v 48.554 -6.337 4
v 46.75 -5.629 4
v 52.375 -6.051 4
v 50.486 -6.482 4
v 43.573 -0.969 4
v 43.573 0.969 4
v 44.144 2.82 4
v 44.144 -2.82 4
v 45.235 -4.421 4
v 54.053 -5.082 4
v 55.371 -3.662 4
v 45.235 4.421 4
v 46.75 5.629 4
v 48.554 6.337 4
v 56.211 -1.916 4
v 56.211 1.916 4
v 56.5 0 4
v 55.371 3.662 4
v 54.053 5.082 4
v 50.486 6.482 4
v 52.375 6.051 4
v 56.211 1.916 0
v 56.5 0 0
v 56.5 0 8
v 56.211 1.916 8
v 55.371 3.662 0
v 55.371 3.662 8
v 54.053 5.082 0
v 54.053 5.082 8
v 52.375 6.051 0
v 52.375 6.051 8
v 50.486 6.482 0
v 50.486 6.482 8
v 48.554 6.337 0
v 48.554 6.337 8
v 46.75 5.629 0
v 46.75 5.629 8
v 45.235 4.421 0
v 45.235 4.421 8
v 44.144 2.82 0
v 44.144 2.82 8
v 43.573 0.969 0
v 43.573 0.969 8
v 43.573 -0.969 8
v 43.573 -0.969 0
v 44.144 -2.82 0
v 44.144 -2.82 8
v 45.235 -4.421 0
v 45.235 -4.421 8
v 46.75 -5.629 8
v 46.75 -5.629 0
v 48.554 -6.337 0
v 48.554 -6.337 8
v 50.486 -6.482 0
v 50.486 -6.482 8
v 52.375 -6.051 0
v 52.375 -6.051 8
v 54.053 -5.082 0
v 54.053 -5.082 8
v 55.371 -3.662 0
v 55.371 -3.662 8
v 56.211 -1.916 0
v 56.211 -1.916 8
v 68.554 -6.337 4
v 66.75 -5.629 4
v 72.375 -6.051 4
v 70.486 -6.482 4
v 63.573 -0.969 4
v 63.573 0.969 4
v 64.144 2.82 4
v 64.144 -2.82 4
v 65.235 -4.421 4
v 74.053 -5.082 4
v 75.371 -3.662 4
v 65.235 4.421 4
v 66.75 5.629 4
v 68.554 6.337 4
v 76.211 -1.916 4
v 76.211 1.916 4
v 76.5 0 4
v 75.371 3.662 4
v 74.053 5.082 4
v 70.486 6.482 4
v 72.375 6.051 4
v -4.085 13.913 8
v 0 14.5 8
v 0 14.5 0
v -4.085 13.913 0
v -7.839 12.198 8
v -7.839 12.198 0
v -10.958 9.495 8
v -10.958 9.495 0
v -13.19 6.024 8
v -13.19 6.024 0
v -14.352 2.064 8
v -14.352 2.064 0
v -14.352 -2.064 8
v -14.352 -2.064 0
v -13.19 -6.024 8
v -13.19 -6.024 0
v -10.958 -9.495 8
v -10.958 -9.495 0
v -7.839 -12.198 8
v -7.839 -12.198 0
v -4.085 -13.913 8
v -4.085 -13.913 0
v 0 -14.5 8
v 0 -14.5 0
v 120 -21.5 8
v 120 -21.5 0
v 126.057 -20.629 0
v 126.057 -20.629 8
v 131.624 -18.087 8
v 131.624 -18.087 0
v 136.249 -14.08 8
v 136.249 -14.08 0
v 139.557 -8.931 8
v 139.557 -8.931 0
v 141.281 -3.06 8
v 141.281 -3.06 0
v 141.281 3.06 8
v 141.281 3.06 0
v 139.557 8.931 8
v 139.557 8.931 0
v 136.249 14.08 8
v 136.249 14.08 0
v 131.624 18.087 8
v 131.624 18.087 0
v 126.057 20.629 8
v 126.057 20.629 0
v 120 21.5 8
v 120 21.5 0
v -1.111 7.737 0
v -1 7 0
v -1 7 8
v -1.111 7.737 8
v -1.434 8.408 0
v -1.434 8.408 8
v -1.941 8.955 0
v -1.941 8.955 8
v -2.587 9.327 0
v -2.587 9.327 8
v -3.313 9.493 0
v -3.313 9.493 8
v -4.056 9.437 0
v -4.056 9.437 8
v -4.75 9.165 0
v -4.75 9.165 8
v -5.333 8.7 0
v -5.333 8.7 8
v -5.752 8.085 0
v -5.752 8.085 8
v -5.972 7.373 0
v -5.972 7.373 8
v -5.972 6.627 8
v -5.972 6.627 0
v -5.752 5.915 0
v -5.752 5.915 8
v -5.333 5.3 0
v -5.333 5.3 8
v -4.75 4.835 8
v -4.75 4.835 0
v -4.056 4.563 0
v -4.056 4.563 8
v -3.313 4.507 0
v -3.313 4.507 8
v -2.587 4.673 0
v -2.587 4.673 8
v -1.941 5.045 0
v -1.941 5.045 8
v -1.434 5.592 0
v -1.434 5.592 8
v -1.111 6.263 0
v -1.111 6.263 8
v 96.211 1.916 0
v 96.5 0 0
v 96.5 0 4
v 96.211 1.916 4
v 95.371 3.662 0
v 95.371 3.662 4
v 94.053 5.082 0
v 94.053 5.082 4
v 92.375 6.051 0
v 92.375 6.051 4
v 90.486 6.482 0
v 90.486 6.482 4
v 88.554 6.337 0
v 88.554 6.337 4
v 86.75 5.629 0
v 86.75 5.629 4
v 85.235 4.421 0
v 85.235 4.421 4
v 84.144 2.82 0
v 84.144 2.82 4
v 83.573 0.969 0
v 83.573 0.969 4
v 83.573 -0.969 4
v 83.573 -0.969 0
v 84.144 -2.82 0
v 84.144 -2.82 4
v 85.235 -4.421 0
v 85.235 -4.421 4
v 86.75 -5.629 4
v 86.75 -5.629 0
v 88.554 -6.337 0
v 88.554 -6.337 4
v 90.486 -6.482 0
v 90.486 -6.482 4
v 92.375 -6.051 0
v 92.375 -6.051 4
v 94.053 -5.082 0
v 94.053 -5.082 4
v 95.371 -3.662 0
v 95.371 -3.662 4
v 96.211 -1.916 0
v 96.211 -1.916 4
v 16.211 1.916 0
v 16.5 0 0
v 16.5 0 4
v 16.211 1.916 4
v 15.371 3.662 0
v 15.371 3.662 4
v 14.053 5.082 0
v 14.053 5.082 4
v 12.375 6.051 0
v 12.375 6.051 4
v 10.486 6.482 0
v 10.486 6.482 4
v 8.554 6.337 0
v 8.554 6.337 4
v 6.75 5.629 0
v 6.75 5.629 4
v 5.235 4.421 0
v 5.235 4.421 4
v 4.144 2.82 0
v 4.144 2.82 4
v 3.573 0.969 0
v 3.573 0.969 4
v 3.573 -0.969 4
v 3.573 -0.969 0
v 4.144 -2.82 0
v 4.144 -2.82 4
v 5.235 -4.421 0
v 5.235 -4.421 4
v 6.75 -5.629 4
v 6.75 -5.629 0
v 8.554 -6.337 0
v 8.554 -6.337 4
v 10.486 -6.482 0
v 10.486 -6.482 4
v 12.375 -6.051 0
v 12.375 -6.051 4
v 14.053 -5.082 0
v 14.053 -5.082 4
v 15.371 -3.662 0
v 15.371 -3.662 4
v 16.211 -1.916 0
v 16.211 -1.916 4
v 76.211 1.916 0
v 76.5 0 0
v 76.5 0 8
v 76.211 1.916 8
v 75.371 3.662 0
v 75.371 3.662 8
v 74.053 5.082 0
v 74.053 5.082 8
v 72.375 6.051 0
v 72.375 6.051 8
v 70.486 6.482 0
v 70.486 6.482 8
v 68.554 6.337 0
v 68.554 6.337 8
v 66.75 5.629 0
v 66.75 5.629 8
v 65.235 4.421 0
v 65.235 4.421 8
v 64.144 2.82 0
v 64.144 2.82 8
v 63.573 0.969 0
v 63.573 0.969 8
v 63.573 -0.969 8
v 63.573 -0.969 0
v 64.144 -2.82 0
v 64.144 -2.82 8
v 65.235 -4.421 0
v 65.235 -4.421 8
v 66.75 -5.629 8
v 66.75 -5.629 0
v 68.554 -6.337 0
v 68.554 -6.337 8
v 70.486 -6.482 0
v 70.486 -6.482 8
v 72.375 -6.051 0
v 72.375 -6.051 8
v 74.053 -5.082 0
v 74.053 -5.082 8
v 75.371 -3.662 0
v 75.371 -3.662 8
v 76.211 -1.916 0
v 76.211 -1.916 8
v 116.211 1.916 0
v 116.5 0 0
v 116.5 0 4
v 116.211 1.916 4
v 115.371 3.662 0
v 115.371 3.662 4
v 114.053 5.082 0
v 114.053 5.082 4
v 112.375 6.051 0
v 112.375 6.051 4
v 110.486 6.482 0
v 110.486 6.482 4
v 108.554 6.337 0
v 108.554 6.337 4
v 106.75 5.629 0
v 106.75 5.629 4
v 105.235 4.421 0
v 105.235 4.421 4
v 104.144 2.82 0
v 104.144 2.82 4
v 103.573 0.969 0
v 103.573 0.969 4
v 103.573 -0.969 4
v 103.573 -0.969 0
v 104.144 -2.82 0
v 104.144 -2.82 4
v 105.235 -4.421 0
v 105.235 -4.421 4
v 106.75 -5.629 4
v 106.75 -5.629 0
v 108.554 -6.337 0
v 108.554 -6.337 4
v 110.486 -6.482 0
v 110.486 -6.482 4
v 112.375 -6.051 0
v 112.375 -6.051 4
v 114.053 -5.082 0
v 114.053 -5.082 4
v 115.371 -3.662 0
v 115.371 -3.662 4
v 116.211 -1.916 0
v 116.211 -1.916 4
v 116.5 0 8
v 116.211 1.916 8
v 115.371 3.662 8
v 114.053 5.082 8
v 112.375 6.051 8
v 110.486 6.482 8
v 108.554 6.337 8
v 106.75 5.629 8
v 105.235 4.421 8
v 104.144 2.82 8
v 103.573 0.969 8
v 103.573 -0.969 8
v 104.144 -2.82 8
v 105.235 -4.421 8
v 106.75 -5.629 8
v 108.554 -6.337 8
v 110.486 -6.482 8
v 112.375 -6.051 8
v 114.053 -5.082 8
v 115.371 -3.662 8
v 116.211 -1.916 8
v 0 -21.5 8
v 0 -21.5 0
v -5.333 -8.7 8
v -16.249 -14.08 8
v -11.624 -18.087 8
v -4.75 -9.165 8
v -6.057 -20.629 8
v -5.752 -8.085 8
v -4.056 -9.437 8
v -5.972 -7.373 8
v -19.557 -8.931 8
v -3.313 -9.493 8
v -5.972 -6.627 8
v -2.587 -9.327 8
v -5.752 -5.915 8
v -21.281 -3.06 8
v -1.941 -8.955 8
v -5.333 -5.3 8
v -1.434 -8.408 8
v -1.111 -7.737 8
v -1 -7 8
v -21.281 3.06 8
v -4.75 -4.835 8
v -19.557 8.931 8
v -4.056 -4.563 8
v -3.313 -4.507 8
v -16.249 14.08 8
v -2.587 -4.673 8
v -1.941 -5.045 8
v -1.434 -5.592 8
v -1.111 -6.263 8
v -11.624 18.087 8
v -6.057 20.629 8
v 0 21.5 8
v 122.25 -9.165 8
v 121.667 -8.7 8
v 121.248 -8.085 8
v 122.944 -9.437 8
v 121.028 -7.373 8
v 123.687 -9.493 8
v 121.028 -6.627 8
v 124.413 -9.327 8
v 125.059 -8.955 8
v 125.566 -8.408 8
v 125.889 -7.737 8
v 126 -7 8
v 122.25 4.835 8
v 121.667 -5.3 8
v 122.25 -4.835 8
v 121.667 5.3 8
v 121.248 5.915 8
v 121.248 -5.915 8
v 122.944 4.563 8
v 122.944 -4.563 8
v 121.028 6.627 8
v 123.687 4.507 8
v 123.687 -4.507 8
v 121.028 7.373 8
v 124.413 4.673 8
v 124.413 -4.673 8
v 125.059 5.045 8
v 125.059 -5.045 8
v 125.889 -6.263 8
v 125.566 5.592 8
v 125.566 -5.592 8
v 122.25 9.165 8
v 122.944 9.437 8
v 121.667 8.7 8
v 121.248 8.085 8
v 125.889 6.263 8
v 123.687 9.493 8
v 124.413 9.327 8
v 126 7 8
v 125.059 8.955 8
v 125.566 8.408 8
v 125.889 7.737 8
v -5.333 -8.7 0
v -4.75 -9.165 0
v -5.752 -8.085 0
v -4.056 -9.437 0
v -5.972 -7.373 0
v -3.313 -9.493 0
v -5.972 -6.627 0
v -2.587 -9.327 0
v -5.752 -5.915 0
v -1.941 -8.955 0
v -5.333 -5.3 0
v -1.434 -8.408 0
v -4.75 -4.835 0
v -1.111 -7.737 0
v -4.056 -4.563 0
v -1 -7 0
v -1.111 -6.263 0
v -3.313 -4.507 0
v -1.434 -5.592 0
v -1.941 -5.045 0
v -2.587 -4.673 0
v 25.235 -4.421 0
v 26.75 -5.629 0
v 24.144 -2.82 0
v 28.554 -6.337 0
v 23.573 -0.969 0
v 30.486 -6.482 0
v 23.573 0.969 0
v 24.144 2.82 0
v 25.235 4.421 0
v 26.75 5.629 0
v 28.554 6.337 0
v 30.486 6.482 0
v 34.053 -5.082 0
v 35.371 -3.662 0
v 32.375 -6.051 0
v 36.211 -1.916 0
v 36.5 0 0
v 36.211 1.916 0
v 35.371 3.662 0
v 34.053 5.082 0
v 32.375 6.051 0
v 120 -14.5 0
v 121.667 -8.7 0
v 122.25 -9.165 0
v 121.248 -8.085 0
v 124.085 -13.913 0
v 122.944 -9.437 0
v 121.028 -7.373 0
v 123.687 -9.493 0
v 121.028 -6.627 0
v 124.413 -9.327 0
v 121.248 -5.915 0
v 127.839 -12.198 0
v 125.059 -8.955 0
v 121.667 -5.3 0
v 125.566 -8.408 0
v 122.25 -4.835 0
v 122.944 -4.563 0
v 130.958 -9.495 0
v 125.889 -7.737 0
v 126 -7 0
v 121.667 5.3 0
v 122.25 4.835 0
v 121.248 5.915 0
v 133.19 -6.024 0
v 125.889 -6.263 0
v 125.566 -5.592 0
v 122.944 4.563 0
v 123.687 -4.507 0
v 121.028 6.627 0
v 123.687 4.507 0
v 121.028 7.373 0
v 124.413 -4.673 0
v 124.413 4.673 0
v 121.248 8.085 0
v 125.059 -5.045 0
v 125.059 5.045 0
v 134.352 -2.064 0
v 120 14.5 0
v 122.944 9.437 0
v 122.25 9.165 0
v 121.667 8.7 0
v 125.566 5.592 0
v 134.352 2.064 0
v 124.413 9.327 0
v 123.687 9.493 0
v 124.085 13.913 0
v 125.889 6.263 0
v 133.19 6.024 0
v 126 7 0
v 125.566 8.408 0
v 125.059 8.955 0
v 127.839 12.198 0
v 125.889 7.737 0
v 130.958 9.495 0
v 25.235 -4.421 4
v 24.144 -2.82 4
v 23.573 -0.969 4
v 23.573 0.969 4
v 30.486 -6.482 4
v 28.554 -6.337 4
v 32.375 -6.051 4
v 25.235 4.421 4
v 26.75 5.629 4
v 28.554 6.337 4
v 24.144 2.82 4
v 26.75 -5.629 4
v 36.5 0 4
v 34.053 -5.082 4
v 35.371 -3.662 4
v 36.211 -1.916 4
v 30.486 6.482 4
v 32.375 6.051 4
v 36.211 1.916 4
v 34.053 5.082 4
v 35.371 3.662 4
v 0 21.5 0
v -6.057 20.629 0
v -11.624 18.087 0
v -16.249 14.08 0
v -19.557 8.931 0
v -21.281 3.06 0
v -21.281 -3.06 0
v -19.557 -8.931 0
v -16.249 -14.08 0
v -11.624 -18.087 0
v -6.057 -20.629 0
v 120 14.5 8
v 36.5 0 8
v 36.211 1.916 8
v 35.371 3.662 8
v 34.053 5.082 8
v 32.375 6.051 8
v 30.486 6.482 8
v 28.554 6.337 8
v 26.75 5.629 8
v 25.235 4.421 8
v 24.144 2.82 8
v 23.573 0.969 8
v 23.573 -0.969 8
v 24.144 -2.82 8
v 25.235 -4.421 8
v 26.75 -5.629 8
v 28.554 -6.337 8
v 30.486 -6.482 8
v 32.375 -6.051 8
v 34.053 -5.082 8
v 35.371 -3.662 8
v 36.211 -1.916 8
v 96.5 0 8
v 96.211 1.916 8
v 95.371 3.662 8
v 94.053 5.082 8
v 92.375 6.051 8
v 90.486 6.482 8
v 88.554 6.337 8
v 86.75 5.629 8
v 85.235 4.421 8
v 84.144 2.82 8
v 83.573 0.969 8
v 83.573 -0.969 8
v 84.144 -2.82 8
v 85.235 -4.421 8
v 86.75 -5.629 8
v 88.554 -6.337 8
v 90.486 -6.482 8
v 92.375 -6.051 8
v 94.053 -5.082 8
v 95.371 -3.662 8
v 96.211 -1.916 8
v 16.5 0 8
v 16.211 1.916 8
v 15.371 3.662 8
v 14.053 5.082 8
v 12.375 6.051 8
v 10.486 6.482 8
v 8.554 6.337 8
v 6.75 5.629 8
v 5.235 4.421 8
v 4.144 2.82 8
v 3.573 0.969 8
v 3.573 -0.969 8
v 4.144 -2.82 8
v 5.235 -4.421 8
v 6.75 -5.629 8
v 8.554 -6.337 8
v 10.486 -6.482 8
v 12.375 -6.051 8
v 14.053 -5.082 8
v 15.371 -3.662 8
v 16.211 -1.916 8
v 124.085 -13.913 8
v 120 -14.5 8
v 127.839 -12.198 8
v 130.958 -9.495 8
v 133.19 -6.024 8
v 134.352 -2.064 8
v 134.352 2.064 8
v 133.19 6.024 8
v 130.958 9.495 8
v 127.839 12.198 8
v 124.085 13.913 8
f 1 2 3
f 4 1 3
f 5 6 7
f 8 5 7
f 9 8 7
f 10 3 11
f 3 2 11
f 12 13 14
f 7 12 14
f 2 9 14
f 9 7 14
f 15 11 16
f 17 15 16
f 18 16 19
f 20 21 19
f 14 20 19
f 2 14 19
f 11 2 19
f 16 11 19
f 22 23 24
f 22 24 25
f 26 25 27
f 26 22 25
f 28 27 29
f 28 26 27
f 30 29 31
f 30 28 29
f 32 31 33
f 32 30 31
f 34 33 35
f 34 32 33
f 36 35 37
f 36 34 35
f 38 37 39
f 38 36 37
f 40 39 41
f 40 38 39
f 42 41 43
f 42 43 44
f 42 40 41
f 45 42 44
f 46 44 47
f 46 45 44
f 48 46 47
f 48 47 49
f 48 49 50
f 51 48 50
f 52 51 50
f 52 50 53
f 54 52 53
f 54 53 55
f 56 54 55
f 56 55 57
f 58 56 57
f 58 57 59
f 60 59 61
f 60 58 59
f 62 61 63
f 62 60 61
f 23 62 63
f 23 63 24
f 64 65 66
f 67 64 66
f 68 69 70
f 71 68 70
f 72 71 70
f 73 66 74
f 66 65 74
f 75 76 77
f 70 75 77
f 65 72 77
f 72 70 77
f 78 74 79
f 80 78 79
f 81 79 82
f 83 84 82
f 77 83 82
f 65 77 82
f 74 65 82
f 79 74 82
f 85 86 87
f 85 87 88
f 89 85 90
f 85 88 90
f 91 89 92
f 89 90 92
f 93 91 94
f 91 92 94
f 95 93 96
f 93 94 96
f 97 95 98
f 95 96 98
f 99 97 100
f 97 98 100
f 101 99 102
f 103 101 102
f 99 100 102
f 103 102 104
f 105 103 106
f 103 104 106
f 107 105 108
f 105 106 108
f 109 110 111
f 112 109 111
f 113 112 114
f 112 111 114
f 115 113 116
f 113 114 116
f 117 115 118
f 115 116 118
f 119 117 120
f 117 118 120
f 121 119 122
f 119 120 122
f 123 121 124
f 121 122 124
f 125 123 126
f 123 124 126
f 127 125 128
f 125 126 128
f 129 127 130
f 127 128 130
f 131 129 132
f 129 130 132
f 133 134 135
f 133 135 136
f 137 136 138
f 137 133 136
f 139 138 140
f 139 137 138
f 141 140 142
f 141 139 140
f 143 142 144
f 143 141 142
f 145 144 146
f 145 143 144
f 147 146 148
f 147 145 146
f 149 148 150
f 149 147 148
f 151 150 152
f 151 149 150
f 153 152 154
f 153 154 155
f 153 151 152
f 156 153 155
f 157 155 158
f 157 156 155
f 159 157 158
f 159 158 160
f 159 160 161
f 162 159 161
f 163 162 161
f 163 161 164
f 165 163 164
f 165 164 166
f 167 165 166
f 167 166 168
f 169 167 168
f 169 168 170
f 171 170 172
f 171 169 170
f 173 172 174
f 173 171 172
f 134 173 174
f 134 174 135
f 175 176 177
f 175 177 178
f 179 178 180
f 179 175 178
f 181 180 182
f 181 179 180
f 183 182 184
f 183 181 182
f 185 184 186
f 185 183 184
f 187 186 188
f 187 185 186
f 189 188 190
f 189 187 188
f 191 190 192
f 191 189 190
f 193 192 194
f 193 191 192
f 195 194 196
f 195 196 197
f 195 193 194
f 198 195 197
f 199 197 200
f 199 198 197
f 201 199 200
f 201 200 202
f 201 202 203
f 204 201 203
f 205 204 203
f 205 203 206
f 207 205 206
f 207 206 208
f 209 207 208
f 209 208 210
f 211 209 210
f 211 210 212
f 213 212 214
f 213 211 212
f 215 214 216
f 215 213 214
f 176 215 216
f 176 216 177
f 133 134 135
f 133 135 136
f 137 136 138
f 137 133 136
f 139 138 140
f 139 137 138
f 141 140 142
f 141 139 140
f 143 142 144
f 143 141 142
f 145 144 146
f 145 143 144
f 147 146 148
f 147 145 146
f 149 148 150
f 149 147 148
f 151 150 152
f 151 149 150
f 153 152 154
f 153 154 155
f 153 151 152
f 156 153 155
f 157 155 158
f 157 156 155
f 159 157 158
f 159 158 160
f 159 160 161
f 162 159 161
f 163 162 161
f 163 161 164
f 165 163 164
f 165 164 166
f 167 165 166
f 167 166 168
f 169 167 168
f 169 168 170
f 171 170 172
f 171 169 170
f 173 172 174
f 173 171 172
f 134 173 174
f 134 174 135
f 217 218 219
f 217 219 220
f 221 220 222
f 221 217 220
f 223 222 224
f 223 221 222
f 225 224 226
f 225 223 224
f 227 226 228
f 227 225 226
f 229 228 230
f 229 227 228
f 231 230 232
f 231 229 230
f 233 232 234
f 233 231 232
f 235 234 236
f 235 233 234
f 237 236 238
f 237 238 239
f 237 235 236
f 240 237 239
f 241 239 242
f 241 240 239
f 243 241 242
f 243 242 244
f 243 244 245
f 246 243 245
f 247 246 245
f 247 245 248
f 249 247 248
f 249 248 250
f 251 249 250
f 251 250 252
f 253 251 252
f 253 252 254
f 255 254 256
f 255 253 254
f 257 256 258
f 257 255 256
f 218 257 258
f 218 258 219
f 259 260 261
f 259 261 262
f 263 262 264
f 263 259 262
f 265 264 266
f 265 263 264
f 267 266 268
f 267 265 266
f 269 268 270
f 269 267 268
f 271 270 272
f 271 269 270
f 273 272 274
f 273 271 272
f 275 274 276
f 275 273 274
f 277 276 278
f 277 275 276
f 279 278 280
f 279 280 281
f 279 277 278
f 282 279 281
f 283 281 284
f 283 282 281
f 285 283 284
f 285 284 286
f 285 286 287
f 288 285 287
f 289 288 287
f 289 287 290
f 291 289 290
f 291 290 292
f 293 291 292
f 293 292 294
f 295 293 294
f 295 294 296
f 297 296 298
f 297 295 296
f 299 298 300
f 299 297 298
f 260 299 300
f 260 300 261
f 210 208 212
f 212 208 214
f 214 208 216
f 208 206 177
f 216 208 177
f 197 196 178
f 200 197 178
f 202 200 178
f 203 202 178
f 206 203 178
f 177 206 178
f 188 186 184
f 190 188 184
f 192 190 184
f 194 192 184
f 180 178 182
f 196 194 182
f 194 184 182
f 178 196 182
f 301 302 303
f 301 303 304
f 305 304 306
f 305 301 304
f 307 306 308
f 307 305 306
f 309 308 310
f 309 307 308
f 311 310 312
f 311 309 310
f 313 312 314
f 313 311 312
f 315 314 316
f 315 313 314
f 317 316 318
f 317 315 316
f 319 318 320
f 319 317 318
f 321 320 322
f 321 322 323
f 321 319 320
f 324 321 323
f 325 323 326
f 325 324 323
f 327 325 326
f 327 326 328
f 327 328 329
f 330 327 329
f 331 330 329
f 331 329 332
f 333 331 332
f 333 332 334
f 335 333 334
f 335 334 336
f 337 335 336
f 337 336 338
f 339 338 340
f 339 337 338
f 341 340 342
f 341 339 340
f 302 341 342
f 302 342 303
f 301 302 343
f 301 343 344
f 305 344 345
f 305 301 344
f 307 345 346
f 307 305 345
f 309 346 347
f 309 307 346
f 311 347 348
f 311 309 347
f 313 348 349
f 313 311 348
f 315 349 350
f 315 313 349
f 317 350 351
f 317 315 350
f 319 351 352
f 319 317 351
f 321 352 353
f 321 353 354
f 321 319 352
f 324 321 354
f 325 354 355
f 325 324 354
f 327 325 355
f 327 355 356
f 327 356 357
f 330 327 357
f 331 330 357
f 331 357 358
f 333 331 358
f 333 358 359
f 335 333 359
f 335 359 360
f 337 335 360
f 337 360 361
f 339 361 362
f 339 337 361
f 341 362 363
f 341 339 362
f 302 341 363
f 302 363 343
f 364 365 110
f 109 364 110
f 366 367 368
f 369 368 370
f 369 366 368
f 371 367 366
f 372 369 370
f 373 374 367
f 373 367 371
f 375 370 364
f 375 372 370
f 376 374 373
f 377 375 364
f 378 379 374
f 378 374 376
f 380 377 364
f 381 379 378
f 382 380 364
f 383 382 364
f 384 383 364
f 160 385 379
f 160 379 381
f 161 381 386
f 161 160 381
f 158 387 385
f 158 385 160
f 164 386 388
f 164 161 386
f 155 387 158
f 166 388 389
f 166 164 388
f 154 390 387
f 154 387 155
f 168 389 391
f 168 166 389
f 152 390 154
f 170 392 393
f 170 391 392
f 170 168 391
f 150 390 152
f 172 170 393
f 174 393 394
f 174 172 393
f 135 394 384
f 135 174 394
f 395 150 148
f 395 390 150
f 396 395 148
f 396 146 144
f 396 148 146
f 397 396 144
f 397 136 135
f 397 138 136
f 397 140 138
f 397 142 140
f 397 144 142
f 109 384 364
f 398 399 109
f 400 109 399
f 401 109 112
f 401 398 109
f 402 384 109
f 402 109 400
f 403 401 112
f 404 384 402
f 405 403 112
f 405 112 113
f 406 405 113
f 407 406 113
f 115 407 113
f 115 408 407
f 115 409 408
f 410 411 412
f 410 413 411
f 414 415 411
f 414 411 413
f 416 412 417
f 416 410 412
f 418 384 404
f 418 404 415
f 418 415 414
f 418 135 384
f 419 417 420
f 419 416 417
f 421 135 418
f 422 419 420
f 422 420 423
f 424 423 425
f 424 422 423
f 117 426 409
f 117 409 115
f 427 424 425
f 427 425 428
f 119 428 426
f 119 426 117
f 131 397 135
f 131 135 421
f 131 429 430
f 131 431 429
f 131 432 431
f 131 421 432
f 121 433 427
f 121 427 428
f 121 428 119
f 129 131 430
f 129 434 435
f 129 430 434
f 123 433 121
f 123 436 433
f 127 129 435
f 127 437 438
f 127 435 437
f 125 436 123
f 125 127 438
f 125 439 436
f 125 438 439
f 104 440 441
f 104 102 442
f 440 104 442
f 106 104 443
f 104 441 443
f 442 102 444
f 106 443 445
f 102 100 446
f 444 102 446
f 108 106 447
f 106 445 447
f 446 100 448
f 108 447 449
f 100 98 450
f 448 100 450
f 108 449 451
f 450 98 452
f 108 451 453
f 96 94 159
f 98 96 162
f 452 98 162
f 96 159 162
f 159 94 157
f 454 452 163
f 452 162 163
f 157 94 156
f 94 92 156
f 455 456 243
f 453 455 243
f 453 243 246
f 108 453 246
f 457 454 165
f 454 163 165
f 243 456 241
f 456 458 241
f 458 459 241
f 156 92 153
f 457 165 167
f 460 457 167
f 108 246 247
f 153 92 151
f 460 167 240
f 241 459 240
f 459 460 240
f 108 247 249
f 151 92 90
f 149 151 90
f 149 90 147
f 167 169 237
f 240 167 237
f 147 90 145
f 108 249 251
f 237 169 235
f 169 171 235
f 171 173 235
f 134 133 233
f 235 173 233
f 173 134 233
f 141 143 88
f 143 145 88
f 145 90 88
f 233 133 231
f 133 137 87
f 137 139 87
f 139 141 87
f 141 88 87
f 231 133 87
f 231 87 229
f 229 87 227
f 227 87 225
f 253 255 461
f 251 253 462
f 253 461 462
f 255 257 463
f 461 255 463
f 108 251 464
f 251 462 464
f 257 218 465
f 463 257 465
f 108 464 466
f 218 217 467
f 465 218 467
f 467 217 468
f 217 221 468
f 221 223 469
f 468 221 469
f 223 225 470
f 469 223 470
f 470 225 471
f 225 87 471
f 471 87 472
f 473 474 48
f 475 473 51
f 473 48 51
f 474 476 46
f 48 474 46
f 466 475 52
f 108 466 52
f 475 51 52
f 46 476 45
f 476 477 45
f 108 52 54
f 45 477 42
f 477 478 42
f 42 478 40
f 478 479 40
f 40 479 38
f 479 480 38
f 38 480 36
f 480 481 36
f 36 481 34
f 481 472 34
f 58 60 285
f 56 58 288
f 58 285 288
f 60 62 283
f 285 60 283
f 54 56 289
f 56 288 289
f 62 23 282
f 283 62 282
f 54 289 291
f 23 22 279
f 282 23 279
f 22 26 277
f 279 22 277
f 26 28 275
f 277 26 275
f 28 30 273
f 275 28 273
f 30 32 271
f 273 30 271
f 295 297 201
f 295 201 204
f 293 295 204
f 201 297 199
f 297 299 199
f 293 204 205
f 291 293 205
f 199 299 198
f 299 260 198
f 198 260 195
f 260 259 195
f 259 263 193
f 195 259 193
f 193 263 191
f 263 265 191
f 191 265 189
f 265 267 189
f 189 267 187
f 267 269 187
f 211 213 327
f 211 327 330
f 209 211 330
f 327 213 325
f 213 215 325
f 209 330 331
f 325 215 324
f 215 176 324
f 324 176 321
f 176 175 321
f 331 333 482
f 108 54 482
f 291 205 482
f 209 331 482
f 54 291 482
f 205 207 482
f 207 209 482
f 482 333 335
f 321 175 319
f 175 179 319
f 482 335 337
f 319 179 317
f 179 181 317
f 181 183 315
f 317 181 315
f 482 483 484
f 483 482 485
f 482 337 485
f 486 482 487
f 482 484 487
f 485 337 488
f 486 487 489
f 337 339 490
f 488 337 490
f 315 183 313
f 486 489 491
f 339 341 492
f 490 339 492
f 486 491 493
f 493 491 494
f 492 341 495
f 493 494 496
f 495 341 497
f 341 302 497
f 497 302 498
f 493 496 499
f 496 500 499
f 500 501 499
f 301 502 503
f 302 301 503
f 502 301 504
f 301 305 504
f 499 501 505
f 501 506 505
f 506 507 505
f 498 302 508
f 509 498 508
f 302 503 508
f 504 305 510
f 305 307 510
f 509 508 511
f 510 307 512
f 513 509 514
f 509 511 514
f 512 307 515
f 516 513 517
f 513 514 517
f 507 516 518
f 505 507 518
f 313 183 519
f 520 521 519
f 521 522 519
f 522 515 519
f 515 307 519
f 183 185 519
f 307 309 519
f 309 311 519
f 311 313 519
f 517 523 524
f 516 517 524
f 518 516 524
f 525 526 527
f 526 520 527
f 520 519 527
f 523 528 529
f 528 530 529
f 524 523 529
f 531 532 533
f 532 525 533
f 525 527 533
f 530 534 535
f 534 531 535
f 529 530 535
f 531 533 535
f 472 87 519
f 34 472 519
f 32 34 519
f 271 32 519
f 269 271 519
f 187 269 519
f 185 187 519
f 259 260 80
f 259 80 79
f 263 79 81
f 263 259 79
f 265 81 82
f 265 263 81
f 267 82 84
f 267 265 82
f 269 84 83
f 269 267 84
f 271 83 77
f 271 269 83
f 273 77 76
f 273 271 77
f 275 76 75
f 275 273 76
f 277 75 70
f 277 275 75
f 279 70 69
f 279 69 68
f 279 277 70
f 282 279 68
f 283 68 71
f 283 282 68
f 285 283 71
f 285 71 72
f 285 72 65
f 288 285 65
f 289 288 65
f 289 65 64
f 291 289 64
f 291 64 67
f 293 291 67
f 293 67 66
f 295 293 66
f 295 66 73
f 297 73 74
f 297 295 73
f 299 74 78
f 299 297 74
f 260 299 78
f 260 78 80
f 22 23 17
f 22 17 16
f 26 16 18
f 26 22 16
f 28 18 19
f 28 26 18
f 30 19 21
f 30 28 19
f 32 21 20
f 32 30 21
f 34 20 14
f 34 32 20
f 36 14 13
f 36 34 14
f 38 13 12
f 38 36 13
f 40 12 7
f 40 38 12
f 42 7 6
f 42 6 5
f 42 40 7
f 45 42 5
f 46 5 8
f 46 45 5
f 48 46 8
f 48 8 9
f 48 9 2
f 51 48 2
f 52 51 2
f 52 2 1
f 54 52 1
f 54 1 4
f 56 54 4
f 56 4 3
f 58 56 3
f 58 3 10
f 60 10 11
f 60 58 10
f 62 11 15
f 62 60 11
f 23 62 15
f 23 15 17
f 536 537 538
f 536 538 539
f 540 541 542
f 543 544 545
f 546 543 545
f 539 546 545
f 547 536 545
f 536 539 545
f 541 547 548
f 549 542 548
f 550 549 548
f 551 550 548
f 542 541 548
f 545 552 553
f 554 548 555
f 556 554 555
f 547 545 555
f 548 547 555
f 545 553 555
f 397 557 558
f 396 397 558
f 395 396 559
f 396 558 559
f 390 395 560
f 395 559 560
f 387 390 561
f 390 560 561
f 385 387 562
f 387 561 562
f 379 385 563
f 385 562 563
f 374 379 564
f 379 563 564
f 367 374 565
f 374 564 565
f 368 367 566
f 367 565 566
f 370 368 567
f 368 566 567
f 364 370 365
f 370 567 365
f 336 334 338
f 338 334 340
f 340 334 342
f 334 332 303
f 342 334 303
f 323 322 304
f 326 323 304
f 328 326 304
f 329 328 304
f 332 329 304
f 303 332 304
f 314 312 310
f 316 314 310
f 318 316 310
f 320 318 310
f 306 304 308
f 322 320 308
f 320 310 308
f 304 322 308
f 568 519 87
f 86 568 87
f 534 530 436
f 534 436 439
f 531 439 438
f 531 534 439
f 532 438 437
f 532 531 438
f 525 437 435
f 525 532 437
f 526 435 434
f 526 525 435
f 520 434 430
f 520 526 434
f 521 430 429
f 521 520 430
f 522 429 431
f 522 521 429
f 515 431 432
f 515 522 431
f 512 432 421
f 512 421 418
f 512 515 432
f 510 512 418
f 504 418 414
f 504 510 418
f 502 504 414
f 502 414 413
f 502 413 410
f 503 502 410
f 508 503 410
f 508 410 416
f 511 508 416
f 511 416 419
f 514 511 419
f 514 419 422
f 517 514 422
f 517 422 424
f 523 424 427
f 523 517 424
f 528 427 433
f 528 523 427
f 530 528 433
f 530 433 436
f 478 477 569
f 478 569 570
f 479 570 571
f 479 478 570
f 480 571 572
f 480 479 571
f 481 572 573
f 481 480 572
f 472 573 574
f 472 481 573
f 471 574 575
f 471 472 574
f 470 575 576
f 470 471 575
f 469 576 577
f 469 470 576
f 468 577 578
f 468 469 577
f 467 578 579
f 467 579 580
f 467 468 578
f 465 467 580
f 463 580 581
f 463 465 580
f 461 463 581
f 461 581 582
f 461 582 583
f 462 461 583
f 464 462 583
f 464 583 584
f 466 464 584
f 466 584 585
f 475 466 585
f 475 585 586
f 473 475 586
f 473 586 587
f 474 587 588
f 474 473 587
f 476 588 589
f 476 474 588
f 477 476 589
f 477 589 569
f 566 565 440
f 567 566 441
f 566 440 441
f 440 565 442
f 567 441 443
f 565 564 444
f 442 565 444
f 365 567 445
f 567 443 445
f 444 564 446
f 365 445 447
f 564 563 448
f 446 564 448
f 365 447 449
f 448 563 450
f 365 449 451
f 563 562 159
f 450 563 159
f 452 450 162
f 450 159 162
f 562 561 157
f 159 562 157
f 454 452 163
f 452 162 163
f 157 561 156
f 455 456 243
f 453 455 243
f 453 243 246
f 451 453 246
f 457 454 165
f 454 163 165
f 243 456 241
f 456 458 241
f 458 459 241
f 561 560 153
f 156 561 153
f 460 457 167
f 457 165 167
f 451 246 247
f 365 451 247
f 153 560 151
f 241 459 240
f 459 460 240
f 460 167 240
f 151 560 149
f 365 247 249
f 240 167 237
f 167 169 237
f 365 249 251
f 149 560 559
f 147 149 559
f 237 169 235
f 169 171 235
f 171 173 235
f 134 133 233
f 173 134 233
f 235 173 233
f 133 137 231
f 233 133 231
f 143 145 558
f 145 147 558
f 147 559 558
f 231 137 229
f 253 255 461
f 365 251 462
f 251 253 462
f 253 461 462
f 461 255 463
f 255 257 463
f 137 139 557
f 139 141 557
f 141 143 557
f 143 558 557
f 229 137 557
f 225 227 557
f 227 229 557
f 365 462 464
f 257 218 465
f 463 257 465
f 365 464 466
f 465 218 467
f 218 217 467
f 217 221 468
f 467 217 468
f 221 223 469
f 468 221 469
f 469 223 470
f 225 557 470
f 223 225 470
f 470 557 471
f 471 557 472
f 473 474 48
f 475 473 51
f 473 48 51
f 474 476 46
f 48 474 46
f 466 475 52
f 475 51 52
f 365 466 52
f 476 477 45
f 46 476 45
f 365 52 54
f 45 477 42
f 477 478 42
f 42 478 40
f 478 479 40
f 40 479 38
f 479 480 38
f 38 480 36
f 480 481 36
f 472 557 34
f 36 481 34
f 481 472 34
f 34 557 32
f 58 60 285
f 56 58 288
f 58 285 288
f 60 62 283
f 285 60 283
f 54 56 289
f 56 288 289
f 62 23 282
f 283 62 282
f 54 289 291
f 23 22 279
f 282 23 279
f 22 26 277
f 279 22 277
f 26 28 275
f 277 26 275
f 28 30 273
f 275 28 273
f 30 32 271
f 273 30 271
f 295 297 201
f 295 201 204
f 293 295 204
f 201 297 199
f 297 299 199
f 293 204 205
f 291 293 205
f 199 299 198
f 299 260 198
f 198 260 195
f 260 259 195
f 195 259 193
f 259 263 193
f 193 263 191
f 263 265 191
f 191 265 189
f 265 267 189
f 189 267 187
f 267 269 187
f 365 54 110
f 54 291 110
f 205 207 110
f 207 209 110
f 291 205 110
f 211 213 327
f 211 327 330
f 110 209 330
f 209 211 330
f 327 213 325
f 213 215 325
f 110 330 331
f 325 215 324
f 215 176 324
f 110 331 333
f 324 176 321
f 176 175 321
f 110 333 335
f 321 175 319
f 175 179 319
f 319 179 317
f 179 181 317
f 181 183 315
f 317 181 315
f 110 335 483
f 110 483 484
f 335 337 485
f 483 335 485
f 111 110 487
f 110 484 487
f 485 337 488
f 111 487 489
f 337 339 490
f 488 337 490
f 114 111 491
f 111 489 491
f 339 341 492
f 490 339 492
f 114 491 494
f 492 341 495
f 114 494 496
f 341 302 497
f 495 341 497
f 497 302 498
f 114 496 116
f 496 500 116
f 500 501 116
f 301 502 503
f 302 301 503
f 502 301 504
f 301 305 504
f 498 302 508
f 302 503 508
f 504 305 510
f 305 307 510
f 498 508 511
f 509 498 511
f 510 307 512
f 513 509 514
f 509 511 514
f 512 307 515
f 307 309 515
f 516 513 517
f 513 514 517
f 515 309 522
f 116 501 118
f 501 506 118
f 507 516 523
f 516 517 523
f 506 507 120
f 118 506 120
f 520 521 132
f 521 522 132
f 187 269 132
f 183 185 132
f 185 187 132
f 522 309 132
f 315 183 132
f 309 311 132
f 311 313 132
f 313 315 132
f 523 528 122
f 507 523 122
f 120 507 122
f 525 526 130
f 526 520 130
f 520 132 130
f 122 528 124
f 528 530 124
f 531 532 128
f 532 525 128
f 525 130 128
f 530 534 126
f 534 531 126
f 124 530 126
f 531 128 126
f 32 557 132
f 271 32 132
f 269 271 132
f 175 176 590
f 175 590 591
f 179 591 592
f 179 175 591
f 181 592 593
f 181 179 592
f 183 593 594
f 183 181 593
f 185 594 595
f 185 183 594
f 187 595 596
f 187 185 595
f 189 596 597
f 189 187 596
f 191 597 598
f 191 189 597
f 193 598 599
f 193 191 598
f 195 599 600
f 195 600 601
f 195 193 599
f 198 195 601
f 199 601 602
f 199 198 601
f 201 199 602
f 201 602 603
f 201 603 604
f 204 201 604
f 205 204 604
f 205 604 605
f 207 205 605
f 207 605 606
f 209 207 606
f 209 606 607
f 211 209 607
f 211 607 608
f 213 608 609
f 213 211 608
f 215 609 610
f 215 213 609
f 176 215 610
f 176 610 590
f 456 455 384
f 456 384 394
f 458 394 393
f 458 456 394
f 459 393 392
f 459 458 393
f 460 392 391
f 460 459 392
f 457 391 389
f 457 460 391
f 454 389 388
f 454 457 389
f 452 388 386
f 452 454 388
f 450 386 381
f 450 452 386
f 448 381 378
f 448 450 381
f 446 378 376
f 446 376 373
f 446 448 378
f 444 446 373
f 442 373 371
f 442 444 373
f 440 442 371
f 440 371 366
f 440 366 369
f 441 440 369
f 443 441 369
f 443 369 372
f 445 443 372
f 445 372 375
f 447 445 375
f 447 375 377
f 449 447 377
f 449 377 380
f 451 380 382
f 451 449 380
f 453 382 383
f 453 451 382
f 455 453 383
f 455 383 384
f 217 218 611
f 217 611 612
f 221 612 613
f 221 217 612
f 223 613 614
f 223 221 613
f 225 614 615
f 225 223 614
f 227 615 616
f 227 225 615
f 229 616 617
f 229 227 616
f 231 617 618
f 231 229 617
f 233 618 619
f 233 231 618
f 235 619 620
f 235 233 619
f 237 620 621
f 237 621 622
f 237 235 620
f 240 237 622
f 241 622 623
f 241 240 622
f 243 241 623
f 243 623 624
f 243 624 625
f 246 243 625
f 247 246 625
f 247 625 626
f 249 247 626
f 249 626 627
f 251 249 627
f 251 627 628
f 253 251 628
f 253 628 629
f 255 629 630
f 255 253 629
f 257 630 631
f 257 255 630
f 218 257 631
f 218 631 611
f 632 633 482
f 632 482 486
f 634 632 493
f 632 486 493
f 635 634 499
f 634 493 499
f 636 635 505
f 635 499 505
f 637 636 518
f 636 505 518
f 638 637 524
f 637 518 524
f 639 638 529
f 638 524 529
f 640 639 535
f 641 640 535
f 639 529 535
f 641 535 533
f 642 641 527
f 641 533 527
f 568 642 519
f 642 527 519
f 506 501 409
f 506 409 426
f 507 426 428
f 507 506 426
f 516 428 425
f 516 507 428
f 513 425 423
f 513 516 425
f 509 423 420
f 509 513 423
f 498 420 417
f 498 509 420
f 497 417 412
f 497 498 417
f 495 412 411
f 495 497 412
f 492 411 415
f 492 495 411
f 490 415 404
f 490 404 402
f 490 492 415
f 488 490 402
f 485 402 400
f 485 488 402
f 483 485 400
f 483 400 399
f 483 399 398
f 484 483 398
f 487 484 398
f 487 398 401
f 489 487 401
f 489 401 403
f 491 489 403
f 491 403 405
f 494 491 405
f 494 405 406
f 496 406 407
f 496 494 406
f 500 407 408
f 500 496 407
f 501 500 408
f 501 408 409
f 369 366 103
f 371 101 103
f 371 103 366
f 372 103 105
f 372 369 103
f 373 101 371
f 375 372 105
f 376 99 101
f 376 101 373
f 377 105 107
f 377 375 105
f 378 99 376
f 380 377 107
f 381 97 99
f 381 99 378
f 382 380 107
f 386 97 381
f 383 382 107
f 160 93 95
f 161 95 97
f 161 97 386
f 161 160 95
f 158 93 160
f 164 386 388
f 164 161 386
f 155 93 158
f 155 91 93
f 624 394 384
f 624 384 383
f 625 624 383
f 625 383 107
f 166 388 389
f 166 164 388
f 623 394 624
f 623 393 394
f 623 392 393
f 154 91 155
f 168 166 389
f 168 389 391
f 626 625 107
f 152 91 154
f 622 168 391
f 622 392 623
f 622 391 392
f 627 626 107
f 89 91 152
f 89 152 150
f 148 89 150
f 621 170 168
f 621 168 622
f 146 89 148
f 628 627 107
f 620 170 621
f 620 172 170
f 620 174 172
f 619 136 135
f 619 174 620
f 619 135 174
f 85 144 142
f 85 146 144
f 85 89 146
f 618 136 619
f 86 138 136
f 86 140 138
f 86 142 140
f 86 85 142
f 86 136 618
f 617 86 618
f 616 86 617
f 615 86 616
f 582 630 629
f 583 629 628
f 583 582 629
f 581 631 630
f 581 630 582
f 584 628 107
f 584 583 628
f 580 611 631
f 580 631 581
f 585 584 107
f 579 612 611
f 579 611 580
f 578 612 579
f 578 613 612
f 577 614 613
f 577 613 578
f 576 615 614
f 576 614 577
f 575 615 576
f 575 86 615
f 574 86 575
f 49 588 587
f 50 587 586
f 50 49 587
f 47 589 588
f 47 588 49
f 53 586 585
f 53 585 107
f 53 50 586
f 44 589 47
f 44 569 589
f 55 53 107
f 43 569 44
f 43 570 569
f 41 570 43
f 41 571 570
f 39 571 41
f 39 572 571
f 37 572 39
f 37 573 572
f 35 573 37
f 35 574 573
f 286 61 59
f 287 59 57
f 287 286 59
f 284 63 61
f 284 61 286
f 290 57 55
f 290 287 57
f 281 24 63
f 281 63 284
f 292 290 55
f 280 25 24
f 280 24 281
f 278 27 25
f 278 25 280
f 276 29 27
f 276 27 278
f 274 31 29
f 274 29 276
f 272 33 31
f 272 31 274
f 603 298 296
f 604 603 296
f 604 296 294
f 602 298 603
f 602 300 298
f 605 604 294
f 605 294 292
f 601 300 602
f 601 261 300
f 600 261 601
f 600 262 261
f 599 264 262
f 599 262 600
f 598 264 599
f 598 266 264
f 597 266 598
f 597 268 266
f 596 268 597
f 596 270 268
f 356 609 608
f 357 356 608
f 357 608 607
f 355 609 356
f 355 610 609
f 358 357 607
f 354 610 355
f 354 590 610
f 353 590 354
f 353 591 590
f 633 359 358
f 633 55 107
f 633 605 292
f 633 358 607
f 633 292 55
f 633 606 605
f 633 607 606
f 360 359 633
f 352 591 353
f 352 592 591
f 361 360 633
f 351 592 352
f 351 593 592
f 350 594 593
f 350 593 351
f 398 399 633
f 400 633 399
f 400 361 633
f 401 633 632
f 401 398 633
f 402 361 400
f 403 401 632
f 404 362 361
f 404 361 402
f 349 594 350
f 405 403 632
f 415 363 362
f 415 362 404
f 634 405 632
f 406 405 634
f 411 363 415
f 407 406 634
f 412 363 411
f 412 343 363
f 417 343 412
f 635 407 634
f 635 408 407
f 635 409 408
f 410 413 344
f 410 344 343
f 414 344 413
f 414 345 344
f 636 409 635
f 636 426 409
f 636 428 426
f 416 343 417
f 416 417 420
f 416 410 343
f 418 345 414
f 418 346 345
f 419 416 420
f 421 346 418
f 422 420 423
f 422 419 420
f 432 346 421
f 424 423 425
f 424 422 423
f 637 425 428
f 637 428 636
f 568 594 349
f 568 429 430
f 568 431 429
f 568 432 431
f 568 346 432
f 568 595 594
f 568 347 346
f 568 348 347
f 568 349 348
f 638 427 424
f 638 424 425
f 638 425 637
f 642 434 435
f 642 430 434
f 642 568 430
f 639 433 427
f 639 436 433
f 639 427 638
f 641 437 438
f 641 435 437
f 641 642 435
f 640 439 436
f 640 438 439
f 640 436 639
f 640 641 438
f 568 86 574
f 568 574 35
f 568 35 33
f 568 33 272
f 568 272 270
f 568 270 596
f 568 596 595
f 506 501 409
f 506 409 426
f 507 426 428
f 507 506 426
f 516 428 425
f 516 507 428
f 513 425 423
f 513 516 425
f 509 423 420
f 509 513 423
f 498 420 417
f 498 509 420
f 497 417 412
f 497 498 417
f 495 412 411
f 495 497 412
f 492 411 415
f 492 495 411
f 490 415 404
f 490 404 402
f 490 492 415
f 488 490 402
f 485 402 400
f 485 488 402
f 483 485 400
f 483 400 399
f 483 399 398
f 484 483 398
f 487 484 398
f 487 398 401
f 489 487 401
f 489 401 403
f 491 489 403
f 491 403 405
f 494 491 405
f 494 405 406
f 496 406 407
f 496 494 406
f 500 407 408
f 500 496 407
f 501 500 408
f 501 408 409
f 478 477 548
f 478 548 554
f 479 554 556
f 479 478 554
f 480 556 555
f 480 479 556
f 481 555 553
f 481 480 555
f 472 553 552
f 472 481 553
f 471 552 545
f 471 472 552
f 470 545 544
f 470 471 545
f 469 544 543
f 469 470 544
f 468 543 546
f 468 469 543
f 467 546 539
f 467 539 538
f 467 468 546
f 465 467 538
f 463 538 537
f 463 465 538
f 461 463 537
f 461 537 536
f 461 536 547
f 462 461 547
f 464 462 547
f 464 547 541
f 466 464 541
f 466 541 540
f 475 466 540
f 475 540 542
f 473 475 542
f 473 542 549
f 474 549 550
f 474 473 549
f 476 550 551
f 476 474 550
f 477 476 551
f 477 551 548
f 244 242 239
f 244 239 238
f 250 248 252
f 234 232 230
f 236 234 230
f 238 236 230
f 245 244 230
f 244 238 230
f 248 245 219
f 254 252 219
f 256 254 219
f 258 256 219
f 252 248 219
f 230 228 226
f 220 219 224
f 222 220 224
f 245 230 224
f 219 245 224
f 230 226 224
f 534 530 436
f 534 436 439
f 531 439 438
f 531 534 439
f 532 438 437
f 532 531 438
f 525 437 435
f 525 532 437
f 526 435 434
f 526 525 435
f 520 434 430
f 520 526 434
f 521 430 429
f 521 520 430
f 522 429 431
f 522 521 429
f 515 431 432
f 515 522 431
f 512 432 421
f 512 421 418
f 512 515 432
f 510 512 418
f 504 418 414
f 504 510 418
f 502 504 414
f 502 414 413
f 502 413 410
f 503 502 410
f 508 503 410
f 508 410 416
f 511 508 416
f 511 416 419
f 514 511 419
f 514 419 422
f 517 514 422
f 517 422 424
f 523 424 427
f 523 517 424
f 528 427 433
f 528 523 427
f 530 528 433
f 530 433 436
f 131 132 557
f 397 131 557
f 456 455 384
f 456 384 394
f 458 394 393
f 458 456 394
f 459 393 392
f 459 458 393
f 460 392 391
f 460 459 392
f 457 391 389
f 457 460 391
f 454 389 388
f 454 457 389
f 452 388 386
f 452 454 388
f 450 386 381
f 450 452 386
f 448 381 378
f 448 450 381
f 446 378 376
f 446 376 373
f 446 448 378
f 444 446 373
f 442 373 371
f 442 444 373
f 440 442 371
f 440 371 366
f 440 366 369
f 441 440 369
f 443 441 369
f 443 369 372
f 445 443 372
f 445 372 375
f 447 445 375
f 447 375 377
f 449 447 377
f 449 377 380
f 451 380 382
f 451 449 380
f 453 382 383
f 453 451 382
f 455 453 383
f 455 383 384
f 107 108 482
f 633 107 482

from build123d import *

# Parameters (mm, degrees)
F0_R     = 2.5
F0_R_2   = 6.5
F1_DEPTH = 8
F3_DEPTH = 8
F4_DEPTH = 8
F5_DEPTH = 4


with BuildPart() as f1:
    # F0 (on Top) → F1 (new body)
    with BuildSketch(Plane.XY):
        with BuildLine():
            Line((120, 14.5), (0, 14.5))
            ThreePointArc((0, 14.5), (-14.5, 0), (0, -14.5))
            Line((0, -14.5), (120, -14.5))
            ThreePointArc((120, -14.5), (134.5, 0), (120, 14.5))
        make_face()
        with Locations((-3.5, -7)):
            Circle(F0_R, mode=Mode.SUBTRACT)
        with Locations((123.5, -7)):
            Circle(F0_R, mode=Mode.SUBTRACT)
        with Locations((10, 0)):
            Circle(F0_R_2, mode=Mode.SUBTRACT)
        with Locations((-3.5, 7)):
            Circle(F0_R, mode=Mode.SUBTRACT)
        with Locations((30, 0)):
            Circle(F0_R_2, mode=Mode.SUBTRACT)
        with Locations((50, 0)):
            Circle(F0_R_2, mode=Mode.SUBTRACT)
        with Locations((70, 0)):
            Circle(F0_R_2, mode=Mode.SUBTRACT)
        with Locations((90, 0)):
            Circle(F0_R_2, mode=Mode.SUBTRACT)
        with Locations((110, 0)):
            Circle(F0_R_2, mode=Mode.SUBTRACT)
        with Locations((123.5, 7)):
            Circle(F0_R, mode=Mode.SUBTRACT)
    extrude(amount=F1_DEPTH)


with BuildPart() as f3:
    # F2 (on Top) → F3 (new body)
    with BuildSketch(Plane.XY):
        with BuildLine():
            Line((120, 21.5), (0, 21.5))
            ThreePointArc((0, 21.5), (-21.5, 0), (0, -21.5))
            Line((0, -21.5), (120, -21.5))
            ThreePointArc((120, -21.5), (141.5, 0), (120, 21.5))
        make_face()
    extrude(amount=F3_DEPTH)

    # F0 (on Top) → F4 (cut, through all)
    with BuildSketch(Plane.XY):
        with Locations((-3.5, -7)):
            Circle(F0_R)
        with Locations((-3.5, 7)):
            Circle(F0_R)
        with Locations((123.5, 7)):
            Circle(F0_R)
        with Locations((123.5, -7)):
            Circle(F0_R)
    extrude(amount=F4_DEPTH, mode=Mode.SUBTRACT)

    # F0 (on Top) → F5 (cut)
    with BuildSketch(Plane.XY):
        with Locations((10, 0)):
            Circle(F0_R_2)
        with Locations((30, 0)):
            Circle(F0_R_2)
        with Locations((50, 0)):
            Circle(F0_R_2)
        with Locations((70, 0)):
            Circle(F0_R_2)
        with Locations((90, 0)):
            Circle(F0_R_2)
        with Locations((110, 0)):
            Circle(F0_R_2)
    extrude(amount=F5_DEPTH, mode=Mode.SUBTRACT)


solid = Compound([f1.part, f3.part])
